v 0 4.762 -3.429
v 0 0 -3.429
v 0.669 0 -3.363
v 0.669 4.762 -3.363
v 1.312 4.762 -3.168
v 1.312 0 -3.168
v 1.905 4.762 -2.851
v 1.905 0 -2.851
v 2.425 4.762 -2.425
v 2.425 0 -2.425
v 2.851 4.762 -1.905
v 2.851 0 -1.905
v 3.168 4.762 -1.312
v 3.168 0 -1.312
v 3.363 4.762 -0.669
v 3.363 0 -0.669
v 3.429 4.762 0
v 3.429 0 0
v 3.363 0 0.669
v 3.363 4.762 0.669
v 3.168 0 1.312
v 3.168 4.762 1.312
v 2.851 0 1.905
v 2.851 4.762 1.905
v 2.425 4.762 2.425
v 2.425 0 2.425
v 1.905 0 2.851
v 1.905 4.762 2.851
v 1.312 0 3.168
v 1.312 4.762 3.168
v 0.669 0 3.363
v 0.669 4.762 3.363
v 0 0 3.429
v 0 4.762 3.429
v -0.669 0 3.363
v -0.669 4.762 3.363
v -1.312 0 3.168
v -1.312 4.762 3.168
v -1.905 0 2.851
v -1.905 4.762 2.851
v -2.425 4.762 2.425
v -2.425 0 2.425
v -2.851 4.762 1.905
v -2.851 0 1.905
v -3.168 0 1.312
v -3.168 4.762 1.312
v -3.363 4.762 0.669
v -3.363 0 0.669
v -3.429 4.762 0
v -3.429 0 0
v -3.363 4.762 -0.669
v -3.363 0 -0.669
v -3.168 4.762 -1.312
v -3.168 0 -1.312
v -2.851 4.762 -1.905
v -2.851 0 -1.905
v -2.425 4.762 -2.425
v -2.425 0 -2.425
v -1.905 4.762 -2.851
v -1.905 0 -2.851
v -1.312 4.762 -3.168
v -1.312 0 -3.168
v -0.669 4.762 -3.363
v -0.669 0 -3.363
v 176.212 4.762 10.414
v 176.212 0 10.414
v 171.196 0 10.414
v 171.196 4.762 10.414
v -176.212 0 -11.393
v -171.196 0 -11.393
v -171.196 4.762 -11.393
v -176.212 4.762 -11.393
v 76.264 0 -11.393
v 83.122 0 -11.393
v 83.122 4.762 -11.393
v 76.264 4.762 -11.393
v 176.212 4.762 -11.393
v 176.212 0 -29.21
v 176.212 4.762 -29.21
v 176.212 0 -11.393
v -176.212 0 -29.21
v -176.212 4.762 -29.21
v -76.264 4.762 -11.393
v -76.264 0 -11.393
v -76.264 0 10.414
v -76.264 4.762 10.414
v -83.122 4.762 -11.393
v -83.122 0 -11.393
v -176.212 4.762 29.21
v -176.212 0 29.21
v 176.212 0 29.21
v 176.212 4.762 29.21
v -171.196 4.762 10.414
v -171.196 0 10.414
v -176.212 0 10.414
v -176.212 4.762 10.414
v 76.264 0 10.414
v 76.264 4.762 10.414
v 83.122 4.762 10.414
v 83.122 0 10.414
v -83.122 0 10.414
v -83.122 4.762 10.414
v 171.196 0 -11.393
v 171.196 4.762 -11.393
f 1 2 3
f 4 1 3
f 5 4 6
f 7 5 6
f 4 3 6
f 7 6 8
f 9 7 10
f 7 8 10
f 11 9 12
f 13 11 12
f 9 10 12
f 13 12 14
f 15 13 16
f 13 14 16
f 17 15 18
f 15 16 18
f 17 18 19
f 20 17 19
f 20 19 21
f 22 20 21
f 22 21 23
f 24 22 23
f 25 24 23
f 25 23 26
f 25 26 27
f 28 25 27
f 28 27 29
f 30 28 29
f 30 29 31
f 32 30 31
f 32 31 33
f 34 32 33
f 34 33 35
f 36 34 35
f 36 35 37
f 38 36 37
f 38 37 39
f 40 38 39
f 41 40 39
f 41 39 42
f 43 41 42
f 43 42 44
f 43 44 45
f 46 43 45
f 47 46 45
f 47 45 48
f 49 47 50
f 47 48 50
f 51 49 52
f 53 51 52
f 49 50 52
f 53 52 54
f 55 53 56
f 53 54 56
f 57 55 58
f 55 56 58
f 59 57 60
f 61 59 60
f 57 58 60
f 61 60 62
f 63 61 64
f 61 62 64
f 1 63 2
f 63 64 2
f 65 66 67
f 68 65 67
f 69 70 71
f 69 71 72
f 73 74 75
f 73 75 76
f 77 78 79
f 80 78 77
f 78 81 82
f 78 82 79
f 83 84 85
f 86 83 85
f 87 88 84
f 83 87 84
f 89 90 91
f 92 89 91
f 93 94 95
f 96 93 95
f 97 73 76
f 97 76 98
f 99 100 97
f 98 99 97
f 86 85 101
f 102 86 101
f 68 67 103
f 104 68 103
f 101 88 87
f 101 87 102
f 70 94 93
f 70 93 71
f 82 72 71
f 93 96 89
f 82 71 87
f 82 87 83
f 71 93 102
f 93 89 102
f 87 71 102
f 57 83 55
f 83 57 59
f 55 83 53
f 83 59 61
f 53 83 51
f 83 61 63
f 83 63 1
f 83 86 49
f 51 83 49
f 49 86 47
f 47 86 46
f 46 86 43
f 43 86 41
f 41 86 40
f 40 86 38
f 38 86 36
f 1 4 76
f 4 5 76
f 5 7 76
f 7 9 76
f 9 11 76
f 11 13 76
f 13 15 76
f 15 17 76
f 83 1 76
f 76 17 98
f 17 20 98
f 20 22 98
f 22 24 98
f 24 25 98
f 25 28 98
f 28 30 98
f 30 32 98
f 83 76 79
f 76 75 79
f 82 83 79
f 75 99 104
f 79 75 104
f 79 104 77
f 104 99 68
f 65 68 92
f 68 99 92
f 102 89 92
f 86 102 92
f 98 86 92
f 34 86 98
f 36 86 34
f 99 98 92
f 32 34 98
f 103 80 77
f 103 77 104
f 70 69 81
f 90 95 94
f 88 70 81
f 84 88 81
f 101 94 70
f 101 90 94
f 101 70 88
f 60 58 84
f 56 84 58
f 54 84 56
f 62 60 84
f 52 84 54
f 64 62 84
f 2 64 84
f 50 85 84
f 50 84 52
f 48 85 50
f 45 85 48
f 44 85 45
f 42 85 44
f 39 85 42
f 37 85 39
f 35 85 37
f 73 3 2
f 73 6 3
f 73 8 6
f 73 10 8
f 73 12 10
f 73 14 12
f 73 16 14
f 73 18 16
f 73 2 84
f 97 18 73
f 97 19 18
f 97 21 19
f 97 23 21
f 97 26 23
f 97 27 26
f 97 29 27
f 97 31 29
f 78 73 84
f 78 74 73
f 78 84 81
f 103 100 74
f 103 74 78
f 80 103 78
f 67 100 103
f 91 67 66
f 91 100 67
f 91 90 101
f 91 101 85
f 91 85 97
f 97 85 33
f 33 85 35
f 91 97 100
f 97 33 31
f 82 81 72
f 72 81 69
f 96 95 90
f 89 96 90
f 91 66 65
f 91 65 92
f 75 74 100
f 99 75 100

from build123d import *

# Parameters (mm, degrees)
SKETCH1_W           = 355.6
SKETCH1_H           = 58.42
BOSS_EXTRUDE1_DEPTH = 4.7625
SKETCH2_W           = 6.858
SKETCH2_H           = 21.806929344
SKETCH2_W_2         = 6.35
SKETCH2_H_2         = 21.298929344
CUT_EXTRUDE1_DEPTH  = 181.246346721
SKETCH3_W           = 1.5875
SKETCH3_H           = 17.817070656
SKETCH3_H_2         = 18.796
CUT_EXTRUDE2_DEPTH  = 181.246346721
SKETCH4_W           = 0.3175
SKETCH4_H           = 21.806929344
BOSS_EXTRUDE2_DEPTH = 4.7625
SKETCH5_W           = 0.3175
SKETCH5_H           = 21.806929344
CUT_EXTRUDE3_DEPTH  = 179.68058278
SKETCH6_R           = 3.429
CUT_EXTRUDE4_DEPTH  = 179.68058278


with BuildPart() as part:
    # Sketch1 → Boss-Extrude1 (new body)
    with BuildSketch(Plane(origin=(0, 0, 0), x_dir=(1, 0, 0), z_dir=(0, 1, 0))):
        Rectangle(SKETCH1_W, SKETCH1_H)
    extrude(amount=BOSS_EXTRUDE1_DEPTH)

    # Sketch2 → Cut-Extrude1 (cut, through all)
    with BuildSketch(Plane(origin=(0, 0, 0), x_dir=(-1, 0, 0), z_dir=(0, -1, 0))):
        with Locations((174.625, 0.489464672)):
            Rectangle(SKETCH2_W, SKETCH2_H)
        with Locations((174.625, 0.489464672)):
            Rectangle(SKETCH2_W_2, SKETCH2_H_2, mode=Mode.SUBTRACT)
        with Locations((79.375, 0.489464672)):
            Rectangle(SKETCH2_W, SKETCH2_H)
        with Locations((79.375, 0.489464672)):
            Rectangle(SKETCH2_W_2, SKETCH2_H_2, mode=Mode.SUBTRACT)
        with Locations((-79.375, 0.489464672)):
            Rectangle(SKETCH2_W, SKETCH2_H)
        with Locations((-79.375, 0.489464672)):
            Rectangle(SKETCH2_W_2, SKETCH2_H_2, mode=Mode.SUBTRACT)
        with Locations((-174.625, 0.489464672)):
            Rectangle(SKETCH2_W, SKETCH2_H)
        with Locations((-174.625, 0.489464672)):
            Rectangle(SKETCH2_W_2, SKETCH2_H_2, mode=Mode.SUBTRACT)
    extrude(amount=-CUT_EXTRUDE1_DEPTH, mode=Mode.SUBTRACT)


with BuildPart() as cut_extrude1_kept_piece:
    # of the separate pieces the step leaves, the one the design keeps (cut_extrude1_pieces_kept)
    add(part.part.solids().sort_by_distance((-177.8, 0, -29.21))[0])

    # Sketch3 → Cut-Extrude2 (cut, through all)
    with BuildSketch(Plane.XZ):
        with Locations((177.00625, -20.301464672)):
            Rectangle(SKETCH3_W, SKETCH3_H)
        with Locations((177.00625, 19.812)):
            Rectangle(SKETCH3_W, SKETCH3_H_2)
        with Locations((-177.00625, -20.301464672)):
            Rectangle(SKETCH3_W, SKETCH3_H)
        with Locations((-177.00625, 19.812)):
            Rectangle(SKETCH3_W, SKETCH3_H_2)
    extrude(amount=-CUT_EXTRUDE2_DEPTH, mode=Mode.SUBTRACT)

    # Sketch4 → Boss-Extrude2 (add)
    with BuildSketch(Plane.XZ):
        with Locations((76.10475, -0.489464672)):
            Rectangle(SKETCH4_W, SKETCH4_H)
        with Locations((-76.10475, -0.489464672)):
            Rectangle(SKETCH4_W, SKETCH4_H)
    extrude(amount=-BOSS_EXTRUDE2_DEPTH)

    # Sketch5 → Cut-Extrude3 (cut, through all)
    with BuildSketch(Plane.XZ):
        with Locations((-82.96275, -0.489464672)):
            Rectangle(SKETCH5_W, SKETCH5_H)
        with Locations((82.96275, -0.489464672)):
            Rectangle(SKETCH5_W, SKETCH5_H)
    extrude(amount=-CUT_EXTRUDE3_DEPTH, mode=Mode.SUBTRACT)

    # Sketch6 → Cut-Extrude4 (cut, through all)
    with BuildSketch(Plane.XZ):
        with Locations(Location((0, 0, 0), (0, 0, 270))):
            Circle(SKETCH6_R)
    extrude(amount=-CUT_EXTRUDE4_DEPTH, mode=Mode.SUBTRACT)


solid = cut_extrude1_kept_piece.part
